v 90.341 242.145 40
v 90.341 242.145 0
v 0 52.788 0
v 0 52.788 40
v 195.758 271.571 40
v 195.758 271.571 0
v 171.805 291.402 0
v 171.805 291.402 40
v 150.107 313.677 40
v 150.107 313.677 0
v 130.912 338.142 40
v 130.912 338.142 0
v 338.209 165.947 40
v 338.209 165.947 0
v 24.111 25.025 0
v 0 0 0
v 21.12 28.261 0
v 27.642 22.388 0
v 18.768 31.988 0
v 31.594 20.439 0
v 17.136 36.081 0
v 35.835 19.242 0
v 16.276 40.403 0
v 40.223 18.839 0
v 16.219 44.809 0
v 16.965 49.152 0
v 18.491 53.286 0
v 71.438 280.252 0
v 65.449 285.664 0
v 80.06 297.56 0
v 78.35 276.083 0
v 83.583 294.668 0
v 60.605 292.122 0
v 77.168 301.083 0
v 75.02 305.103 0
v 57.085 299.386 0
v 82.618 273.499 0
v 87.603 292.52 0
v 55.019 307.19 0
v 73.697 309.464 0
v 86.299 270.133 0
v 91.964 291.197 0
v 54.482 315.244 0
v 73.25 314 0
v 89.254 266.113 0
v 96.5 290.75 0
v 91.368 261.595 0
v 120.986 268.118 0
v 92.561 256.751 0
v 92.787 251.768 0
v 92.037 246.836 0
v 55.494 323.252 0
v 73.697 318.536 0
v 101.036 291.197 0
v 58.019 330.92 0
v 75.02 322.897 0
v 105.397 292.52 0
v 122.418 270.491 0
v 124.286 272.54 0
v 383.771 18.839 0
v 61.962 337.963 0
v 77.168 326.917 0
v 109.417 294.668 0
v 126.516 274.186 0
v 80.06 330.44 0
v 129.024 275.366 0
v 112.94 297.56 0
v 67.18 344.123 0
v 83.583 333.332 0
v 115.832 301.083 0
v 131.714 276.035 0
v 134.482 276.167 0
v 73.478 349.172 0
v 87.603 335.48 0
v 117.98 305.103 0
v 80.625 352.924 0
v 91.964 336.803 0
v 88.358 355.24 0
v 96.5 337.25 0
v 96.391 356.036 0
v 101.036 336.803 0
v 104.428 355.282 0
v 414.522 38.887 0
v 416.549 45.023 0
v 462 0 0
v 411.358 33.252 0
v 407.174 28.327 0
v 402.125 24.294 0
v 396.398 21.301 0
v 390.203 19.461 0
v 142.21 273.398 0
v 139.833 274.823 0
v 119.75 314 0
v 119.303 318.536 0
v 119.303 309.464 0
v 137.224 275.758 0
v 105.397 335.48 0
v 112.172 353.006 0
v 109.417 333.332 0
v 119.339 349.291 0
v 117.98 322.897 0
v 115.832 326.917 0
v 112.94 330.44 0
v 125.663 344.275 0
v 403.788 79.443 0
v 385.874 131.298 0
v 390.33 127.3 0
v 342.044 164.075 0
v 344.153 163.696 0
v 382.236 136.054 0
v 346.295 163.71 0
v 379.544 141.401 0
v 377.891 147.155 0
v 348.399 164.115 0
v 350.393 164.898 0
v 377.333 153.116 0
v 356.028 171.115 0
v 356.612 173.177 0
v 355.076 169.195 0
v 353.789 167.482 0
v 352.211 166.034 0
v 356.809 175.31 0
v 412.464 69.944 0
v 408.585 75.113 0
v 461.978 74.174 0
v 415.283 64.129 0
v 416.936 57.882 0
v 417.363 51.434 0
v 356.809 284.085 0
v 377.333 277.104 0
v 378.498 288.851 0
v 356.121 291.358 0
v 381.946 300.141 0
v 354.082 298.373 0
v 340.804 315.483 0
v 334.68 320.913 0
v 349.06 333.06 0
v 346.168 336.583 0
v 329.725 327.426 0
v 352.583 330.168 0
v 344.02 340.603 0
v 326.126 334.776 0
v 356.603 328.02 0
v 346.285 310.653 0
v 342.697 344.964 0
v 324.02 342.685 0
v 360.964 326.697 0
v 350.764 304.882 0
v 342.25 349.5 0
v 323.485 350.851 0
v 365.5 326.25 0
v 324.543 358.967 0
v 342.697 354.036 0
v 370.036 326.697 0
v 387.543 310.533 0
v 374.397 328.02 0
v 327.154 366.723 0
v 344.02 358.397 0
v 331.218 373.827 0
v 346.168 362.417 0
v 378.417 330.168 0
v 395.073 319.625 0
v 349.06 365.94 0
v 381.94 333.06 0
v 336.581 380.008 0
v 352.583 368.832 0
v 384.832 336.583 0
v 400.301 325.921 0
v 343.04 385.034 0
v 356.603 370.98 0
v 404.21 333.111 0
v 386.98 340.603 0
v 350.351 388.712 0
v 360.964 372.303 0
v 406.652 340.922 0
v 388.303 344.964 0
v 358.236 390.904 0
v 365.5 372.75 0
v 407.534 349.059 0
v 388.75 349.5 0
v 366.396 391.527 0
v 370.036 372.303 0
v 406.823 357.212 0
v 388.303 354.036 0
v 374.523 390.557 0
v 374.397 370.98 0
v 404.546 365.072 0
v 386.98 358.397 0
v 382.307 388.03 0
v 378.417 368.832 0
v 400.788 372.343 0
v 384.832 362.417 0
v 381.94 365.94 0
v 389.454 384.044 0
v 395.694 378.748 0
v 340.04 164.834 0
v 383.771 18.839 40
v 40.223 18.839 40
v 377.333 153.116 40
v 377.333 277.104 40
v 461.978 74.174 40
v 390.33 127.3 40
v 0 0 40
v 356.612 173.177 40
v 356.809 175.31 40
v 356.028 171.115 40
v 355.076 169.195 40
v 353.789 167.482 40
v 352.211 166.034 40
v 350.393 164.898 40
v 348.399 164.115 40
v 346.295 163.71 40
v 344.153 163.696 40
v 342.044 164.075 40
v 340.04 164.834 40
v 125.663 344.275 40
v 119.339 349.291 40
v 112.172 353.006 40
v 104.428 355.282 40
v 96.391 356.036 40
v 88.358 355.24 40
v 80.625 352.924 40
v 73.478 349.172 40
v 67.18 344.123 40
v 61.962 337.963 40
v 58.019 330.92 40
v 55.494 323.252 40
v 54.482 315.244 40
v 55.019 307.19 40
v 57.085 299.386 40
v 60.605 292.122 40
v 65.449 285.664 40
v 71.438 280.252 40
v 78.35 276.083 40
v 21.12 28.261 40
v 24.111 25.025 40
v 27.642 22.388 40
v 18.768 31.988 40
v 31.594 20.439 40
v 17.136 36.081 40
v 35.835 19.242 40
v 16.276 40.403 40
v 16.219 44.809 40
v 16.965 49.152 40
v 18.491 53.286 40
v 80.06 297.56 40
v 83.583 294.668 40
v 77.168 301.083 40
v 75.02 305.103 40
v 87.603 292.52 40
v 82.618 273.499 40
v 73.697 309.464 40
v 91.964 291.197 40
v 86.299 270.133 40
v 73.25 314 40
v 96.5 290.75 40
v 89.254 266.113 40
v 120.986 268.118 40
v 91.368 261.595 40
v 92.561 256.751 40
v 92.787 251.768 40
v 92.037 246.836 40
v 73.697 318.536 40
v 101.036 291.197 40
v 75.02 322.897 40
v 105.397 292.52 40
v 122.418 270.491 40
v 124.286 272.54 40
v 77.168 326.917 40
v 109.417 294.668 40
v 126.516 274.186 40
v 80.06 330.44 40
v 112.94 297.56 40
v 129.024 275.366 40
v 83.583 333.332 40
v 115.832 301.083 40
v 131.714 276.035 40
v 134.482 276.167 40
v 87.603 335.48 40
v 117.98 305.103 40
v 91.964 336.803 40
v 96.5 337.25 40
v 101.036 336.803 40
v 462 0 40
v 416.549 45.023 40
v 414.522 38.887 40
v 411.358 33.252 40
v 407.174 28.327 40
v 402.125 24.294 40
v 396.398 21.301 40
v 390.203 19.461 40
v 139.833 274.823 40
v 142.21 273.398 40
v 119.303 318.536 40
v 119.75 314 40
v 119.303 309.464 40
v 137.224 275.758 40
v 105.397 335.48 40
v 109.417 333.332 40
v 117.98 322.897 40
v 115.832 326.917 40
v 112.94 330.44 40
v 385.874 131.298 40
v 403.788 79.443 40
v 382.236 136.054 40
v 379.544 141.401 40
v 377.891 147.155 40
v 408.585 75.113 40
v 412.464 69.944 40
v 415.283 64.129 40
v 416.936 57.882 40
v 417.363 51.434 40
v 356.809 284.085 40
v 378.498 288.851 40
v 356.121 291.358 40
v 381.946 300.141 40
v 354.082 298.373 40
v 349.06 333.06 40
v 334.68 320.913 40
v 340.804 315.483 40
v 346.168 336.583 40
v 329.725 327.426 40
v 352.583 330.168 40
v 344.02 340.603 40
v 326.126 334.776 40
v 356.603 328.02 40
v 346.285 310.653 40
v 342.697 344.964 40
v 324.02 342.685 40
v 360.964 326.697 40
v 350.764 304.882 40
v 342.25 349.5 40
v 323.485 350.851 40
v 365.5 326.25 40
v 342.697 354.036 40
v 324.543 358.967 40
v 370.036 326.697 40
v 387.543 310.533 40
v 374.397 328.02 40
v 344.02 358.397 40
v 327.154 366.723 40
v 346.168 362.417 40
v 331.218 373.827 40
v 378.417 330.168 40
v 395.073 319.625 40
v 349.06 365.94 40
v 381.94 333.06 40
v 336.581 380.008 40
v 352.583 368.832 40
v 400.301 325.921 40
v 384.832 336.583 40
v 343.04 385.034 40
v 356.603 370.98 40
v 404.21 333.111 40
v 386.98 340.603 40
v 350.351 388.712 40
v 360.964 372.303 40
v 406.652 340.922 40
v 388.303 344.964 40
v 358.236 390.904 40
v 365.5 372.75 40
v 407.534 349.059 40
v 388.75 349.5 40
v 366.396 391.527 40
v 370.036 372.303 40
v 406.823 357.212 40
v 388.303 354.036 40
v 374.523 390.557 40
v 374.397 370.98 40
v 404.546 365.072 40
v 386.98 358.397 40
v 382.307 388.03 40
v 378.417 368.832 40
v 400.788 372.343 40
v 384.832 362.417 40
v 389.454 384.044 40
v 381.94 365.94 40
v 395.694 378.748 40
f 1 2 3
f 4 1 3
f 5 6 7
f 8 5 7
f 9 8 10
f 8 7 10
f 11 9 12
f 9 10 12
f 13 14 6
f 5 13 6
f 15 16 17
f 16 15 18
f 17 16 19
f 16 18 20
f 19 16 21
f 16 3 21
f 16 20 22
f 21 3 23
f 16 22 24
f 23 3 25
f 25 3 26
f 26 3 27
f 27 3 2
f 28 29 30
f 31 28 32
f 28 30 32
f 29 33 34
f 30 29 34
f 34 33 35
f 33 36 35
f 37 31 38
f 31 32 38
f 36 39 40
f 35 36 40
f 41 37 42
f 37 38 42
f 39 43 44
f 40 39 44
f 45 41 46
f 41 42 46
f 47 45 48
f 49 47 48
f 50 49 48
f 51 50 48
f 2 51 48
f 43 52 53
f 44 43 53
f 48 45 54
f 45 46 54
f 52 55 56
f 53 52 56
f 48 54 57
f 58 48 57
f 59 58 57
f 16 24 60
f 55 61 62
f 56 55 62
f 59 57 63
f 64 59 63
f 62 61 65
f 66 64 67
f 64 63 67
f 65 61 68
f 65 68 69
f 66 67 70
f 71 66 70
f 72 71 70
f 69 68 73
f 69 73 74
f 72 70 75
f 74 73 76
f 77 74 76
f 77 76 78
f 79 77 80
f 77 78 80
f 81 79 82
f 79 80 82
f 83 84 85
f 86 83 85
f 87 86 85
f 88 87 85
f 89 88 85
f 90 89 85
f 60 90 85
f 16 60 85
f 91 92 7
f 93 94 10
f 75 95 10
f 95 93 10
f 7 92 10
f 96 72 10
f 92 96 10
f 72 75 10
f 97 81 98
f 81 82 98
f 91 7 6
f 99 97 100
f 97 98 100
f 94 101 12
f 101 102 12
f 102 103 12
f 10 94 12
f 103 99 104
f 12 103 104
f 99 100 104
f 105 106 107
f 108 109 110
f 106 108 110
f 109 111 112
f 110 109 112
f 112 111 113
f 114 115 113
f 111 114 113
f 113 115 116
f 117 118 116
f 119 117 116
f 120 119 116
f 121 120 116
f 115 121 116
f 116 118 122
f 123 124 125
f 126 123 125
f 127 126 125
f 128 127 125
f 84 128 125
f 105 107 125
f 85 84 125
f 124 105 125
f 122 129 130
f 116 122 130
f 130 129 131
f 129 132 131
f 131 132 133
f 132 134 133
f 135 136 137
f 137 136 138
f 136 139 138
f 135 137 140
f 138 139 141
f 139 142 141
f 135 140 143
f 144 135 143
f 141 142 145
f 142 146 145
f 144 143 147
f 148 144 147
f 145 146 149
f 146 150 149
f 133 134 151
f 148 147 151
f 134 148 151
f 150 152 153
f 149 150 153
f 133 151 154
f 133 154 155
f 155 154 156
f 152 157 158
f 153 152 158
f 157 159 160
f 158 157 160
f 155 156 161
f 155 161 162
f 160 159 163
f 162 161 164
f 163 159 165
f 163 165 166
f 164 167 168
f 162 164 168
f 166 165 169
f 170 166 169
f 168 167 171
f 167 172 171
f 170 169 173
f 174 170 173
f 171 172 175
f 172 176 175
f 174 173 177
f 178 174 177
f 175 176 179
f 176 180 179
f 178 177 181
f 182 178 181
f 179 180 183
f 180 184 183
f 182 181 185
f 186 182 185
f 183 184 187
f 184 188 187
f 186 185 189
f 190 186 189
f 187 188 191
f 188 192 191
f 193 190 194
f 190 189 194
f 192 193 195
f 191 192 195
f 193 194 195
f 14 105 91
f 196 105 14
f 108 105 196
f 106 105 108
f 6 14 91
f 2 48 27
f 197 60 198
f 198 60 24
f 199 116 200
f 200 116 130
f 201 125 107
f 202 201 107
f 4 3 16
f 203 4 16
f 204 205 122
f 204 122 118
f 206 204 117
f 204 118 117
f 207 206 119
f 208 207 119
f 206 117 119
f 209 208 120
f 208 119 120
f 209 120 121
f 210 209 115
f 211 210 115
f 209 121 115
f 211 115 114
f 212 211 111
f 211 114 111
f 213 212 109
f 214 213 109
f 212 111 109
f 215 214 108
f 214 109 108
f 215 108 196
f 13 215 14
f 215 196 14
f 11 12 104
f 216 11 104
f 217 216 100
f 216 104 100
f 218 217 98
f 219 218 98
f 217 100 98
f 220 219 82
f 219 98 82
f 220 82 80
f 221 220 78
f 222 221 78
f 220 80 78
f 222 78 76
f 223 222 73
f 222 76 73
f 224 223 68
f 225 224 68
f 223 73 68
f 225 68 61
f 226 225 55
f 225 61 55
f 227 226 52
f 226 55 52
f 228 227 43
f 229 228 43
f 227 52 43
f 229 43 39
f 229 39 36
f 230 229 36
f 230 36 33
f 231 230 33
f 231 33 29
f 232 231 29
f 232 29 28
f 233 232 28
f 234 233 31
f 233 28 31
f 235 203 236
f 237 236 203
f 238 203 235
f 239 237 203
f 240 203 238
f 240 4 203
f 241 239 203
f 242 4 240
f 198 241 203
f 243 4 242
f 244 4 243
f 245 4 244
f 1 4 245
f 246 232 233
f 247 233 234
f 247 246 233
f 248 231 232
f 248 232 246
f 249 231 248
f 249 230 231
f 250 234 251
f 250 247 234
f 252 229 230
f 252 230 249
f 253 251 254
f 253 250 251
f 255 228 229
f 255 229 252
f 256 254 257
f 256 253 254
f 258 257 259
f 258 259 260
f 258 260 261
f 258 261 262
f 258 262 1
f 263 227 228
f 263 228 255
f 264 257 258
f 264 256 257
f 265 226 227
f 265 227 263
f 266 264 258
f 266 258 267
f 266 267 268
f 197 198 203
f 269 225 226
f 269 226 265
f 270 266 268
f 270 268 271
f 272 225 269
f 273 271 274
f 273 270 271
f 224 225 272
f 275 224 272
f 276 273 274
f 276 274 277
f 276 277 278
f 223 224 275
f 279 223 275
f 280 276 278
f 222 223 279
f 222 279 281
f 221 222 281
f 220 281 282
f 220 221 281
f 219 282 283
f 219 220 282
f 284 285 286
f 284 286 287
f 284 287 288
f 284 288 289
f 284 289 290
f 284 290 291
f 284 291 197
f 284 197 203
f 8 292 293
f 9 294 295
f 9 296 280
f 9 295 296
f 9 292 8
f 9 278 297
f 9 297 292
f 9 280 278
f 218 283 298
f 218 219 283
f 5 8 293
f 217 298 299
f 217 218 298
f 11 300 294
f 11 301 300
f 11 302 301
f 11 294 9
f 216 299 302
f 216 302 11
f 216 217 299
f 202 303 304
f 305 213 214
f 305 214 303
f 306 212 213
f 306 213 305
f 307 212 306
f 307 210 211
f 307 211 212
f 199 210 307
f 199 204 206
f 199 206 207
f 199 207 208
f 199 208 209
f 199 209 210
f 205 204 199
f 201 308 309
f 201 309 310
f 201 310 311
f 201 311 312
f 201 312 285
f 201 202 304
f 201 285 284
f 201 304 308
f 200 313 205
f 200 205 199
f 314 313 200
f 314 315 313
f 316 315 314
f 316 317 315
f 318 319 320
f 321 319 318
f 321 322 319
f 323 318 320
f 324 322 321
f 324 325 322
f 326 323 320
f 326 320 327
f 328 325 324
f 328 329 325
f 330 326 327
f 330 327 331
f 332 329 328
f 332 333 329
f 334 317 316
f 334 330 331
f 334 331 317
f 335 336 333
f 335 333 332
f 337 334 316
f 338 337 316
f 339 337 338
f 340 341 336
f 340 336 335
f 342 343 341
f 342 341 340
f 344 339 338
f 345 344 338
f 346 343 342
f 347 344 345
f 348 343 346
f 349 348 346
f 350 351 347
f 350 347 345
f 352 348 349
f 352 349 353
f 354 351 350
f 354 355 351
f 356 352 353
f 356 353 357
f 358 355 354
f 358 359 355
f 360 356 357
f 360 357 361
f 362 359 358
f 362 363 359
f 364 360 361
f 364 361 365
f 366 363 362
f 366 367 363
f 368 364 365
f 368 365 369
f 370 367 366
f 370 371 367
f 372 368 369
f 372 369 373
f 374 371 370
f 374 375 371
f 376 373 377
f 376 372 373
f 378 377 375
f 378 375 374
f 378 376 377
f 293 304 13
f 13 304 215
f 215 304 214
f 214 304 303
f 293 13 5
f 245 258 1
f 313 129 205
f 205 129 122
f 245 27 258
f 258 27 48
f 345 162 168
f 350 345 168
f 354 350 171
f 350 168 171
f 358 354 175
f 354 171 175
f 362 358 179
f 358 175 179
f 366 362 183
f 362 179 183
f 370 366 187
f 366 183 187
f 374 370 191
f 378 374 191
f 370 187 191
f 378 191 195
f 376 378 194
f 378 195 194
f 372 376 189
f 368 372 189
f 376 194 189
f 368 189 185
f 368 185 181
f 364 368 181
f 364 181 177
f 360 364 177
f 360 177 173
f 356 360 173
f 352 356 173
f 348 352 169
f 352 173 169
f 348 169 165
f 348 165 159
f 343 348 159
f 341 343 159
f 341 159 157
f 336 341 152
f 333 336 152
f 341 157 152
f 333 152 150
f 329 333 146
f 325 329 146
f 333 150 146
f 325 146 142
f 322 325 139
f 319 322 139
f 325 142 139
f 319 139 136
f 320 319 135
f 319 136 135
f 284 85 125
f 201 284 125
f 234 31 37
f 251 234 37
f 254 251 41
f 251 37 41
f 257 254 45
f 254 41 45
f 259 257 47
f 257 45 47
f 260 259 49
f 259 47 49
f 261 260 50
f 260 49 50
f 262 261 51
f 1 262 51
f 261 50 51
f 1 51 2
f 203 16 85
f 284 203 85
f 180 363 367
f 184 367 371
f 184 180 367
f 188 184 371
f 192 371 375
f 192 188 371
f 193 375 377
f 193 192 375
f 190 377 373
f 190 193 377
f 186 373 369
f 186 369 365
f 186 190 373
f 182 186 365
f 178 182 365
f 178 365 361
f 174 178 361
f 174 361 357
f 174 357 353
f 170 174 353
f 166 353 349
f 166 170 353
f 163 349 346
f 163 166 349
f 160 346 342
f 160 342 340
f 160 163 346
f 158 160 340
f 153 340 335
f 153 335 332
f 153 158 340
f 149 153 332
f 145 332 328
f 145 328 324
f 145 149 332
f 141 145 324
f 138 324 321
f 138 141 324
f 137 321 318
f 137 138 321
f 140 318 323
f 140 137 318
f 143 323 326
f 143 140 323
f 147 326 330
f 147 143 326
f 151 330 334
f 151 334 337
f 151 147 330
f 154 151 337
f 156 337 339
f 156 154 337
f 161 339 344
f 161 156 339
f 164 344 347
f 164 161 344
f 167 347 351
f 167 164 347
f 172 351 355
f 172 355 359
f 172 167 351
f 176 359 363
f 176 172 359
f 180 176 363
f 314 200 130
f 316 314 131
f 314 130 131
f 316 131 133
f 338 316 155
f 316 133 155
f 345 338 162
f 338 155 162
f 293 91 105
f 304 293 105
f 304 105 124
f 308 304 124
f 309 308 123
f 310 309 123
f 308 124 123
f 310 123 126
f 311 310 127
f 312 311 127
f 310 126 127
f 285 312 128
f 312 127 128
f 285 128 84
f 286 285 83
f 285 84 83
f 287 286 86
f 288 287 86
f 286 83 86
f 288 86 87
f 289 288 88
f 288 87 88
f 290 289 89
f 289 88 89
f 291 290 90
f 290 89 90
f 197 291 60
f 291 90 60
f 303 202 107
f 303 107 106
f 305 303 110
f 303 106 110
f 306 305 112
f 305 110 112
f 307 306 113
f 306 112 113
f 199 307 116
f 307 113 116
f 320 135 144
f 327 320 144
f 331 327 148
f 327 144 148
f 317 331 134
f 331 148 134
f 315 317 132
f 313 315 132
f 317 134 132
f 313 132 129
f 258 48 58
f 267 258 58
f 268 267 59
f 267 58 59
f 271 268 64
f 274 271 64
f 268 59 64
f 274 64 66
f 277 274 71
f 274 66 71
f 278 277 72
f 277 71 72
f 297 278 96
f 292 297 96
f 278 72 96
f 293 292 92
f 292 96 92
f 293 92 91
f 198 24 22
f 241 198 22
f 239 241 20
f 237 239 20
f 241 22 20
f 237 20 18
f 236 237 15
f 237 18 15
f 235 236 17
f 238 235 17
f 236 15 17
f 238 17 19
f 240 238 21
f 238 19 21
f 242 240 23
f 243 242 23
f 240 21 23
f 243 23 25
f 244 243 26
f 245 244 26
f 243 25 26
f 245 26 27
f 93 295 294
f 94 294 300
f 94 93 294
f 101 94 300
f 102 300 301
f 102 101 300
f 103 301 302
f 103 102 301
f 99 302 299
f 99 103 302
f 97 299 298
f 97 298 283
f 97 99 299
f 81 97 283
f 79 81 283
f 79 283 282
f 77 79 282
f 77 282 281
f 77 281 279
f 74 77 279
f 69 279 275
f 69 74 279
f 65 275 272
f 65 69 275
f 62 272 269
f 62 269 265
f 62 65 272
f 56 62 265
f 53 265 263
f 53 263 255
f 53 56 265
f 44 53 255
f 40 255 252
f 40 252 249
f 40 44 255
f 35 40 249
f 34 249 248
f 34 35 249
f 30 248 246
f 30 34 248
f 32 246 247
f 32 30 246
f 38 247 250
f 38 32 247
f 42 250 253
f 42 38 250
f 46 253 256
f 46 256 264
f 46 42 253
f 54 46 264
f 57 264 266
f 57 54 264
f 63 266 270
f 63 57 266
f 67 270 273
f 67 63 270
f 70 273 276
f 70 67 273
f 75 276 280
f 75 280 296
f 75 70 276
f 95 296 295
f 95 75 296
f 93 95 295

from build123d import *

# Parameters (mm, degrees)
SZKIC2_R                    = 23.25
DODANIE_WYCI_GNI_CIE2_DEPTH = 40


with BuildPart() as part:
    # Szkic2 → Dodanie-wyciągnięcie2 (new body)
    with BuildSketch(Plane.XY):
        with BuildLine():
            Line((356.808690949, 284.085111344), (356.808690949, 175.310171823))
            ThreePointArc((356.808690949, 175.310171823), (350.393476668, 164.898302535), (338.208931835, 165.946569461))
            Line((338.208931835, 165.946569461), (195.757922755, 271.57137534))
            ThreePointArc((195.757922755, 271.57137534), (160.658297297, 302.249297223), (130.912486716, 338.142268))
            ThreePointArc((130.912486716, 338.142268), (64.422832686, 341.168431743), (78.350481289, 276.083469083))
            ThreePointArc((78.350481289, 276.083469083), (91.368118976, 261.595098554), (90.340641348, 242.144749939))
            Line((90.340641348, 242.144749939), (0, 52.788302942))
            Line((0, 52.788302942), (0, 0))
            Line((0, 0), (462, 0))
            Line((462, 0), (461.978142717, 74.173973692))
            Line((461.978142717, 74.173973692), (390.329817514, 127.299890384))
            ThreePointArc((390.329817514, 127.299890384), (380.765620141, 138.664659162), (377.333162938, 153.116305376))
            Line((377.333162938, 153.116305376), (377.333162938, 277.104406009))
            ThreePointArc((377.333162938, 277.104406009), (381.945835927, 300.14062202), (395.072603756, 319.624768565))
            ThreePointArc((395.072603756, 319.624768565), (362.301076624, 391.414618398), (340.803653738, 315.482962688))
            ThreePointArc((340.803653738, 315.482962688), (352.576627129, 301.70602424), (356.808690949, 284.085111344))
        make_face()
        with Locations((96.5, 314)):
            Circle(SZKIC2_R, mode=Mode.SUBTRACT)
        with Locations((365.5, 349.5)):
            Circle(SZKIC2_R, mode=Mode.SUBTRACT)
        with BuildLine():
            Line((142.210331035, 273.398097089), (403.788200613, 79.442912954))
            ThreePointArc((403.788200613, 79.442912954), (415.683061467, 41.906486457), (383.77111031, 18.839228227))
            Line((383.77111031, 18.839228227), (40.223377682, 18.839228227))
            ThreePointArc((40.223377682, 18.839228227), (19.858572573, 30.070249276), (18.491115014, 53.286432871))
            Line((18.491115014, 53.286432871), (120.985954342, 268.118410164))
            ThreePointArc((120.985954342, 268.118410164), (130.352396717, 275.766160753), (142.210331035, 273.398097089))
        make_face(mode=Mode.SUBTRACT)
    extrude(amount=DODANIE_WYCI_GNI_CIE2_DEPTH)


solid = part.part
